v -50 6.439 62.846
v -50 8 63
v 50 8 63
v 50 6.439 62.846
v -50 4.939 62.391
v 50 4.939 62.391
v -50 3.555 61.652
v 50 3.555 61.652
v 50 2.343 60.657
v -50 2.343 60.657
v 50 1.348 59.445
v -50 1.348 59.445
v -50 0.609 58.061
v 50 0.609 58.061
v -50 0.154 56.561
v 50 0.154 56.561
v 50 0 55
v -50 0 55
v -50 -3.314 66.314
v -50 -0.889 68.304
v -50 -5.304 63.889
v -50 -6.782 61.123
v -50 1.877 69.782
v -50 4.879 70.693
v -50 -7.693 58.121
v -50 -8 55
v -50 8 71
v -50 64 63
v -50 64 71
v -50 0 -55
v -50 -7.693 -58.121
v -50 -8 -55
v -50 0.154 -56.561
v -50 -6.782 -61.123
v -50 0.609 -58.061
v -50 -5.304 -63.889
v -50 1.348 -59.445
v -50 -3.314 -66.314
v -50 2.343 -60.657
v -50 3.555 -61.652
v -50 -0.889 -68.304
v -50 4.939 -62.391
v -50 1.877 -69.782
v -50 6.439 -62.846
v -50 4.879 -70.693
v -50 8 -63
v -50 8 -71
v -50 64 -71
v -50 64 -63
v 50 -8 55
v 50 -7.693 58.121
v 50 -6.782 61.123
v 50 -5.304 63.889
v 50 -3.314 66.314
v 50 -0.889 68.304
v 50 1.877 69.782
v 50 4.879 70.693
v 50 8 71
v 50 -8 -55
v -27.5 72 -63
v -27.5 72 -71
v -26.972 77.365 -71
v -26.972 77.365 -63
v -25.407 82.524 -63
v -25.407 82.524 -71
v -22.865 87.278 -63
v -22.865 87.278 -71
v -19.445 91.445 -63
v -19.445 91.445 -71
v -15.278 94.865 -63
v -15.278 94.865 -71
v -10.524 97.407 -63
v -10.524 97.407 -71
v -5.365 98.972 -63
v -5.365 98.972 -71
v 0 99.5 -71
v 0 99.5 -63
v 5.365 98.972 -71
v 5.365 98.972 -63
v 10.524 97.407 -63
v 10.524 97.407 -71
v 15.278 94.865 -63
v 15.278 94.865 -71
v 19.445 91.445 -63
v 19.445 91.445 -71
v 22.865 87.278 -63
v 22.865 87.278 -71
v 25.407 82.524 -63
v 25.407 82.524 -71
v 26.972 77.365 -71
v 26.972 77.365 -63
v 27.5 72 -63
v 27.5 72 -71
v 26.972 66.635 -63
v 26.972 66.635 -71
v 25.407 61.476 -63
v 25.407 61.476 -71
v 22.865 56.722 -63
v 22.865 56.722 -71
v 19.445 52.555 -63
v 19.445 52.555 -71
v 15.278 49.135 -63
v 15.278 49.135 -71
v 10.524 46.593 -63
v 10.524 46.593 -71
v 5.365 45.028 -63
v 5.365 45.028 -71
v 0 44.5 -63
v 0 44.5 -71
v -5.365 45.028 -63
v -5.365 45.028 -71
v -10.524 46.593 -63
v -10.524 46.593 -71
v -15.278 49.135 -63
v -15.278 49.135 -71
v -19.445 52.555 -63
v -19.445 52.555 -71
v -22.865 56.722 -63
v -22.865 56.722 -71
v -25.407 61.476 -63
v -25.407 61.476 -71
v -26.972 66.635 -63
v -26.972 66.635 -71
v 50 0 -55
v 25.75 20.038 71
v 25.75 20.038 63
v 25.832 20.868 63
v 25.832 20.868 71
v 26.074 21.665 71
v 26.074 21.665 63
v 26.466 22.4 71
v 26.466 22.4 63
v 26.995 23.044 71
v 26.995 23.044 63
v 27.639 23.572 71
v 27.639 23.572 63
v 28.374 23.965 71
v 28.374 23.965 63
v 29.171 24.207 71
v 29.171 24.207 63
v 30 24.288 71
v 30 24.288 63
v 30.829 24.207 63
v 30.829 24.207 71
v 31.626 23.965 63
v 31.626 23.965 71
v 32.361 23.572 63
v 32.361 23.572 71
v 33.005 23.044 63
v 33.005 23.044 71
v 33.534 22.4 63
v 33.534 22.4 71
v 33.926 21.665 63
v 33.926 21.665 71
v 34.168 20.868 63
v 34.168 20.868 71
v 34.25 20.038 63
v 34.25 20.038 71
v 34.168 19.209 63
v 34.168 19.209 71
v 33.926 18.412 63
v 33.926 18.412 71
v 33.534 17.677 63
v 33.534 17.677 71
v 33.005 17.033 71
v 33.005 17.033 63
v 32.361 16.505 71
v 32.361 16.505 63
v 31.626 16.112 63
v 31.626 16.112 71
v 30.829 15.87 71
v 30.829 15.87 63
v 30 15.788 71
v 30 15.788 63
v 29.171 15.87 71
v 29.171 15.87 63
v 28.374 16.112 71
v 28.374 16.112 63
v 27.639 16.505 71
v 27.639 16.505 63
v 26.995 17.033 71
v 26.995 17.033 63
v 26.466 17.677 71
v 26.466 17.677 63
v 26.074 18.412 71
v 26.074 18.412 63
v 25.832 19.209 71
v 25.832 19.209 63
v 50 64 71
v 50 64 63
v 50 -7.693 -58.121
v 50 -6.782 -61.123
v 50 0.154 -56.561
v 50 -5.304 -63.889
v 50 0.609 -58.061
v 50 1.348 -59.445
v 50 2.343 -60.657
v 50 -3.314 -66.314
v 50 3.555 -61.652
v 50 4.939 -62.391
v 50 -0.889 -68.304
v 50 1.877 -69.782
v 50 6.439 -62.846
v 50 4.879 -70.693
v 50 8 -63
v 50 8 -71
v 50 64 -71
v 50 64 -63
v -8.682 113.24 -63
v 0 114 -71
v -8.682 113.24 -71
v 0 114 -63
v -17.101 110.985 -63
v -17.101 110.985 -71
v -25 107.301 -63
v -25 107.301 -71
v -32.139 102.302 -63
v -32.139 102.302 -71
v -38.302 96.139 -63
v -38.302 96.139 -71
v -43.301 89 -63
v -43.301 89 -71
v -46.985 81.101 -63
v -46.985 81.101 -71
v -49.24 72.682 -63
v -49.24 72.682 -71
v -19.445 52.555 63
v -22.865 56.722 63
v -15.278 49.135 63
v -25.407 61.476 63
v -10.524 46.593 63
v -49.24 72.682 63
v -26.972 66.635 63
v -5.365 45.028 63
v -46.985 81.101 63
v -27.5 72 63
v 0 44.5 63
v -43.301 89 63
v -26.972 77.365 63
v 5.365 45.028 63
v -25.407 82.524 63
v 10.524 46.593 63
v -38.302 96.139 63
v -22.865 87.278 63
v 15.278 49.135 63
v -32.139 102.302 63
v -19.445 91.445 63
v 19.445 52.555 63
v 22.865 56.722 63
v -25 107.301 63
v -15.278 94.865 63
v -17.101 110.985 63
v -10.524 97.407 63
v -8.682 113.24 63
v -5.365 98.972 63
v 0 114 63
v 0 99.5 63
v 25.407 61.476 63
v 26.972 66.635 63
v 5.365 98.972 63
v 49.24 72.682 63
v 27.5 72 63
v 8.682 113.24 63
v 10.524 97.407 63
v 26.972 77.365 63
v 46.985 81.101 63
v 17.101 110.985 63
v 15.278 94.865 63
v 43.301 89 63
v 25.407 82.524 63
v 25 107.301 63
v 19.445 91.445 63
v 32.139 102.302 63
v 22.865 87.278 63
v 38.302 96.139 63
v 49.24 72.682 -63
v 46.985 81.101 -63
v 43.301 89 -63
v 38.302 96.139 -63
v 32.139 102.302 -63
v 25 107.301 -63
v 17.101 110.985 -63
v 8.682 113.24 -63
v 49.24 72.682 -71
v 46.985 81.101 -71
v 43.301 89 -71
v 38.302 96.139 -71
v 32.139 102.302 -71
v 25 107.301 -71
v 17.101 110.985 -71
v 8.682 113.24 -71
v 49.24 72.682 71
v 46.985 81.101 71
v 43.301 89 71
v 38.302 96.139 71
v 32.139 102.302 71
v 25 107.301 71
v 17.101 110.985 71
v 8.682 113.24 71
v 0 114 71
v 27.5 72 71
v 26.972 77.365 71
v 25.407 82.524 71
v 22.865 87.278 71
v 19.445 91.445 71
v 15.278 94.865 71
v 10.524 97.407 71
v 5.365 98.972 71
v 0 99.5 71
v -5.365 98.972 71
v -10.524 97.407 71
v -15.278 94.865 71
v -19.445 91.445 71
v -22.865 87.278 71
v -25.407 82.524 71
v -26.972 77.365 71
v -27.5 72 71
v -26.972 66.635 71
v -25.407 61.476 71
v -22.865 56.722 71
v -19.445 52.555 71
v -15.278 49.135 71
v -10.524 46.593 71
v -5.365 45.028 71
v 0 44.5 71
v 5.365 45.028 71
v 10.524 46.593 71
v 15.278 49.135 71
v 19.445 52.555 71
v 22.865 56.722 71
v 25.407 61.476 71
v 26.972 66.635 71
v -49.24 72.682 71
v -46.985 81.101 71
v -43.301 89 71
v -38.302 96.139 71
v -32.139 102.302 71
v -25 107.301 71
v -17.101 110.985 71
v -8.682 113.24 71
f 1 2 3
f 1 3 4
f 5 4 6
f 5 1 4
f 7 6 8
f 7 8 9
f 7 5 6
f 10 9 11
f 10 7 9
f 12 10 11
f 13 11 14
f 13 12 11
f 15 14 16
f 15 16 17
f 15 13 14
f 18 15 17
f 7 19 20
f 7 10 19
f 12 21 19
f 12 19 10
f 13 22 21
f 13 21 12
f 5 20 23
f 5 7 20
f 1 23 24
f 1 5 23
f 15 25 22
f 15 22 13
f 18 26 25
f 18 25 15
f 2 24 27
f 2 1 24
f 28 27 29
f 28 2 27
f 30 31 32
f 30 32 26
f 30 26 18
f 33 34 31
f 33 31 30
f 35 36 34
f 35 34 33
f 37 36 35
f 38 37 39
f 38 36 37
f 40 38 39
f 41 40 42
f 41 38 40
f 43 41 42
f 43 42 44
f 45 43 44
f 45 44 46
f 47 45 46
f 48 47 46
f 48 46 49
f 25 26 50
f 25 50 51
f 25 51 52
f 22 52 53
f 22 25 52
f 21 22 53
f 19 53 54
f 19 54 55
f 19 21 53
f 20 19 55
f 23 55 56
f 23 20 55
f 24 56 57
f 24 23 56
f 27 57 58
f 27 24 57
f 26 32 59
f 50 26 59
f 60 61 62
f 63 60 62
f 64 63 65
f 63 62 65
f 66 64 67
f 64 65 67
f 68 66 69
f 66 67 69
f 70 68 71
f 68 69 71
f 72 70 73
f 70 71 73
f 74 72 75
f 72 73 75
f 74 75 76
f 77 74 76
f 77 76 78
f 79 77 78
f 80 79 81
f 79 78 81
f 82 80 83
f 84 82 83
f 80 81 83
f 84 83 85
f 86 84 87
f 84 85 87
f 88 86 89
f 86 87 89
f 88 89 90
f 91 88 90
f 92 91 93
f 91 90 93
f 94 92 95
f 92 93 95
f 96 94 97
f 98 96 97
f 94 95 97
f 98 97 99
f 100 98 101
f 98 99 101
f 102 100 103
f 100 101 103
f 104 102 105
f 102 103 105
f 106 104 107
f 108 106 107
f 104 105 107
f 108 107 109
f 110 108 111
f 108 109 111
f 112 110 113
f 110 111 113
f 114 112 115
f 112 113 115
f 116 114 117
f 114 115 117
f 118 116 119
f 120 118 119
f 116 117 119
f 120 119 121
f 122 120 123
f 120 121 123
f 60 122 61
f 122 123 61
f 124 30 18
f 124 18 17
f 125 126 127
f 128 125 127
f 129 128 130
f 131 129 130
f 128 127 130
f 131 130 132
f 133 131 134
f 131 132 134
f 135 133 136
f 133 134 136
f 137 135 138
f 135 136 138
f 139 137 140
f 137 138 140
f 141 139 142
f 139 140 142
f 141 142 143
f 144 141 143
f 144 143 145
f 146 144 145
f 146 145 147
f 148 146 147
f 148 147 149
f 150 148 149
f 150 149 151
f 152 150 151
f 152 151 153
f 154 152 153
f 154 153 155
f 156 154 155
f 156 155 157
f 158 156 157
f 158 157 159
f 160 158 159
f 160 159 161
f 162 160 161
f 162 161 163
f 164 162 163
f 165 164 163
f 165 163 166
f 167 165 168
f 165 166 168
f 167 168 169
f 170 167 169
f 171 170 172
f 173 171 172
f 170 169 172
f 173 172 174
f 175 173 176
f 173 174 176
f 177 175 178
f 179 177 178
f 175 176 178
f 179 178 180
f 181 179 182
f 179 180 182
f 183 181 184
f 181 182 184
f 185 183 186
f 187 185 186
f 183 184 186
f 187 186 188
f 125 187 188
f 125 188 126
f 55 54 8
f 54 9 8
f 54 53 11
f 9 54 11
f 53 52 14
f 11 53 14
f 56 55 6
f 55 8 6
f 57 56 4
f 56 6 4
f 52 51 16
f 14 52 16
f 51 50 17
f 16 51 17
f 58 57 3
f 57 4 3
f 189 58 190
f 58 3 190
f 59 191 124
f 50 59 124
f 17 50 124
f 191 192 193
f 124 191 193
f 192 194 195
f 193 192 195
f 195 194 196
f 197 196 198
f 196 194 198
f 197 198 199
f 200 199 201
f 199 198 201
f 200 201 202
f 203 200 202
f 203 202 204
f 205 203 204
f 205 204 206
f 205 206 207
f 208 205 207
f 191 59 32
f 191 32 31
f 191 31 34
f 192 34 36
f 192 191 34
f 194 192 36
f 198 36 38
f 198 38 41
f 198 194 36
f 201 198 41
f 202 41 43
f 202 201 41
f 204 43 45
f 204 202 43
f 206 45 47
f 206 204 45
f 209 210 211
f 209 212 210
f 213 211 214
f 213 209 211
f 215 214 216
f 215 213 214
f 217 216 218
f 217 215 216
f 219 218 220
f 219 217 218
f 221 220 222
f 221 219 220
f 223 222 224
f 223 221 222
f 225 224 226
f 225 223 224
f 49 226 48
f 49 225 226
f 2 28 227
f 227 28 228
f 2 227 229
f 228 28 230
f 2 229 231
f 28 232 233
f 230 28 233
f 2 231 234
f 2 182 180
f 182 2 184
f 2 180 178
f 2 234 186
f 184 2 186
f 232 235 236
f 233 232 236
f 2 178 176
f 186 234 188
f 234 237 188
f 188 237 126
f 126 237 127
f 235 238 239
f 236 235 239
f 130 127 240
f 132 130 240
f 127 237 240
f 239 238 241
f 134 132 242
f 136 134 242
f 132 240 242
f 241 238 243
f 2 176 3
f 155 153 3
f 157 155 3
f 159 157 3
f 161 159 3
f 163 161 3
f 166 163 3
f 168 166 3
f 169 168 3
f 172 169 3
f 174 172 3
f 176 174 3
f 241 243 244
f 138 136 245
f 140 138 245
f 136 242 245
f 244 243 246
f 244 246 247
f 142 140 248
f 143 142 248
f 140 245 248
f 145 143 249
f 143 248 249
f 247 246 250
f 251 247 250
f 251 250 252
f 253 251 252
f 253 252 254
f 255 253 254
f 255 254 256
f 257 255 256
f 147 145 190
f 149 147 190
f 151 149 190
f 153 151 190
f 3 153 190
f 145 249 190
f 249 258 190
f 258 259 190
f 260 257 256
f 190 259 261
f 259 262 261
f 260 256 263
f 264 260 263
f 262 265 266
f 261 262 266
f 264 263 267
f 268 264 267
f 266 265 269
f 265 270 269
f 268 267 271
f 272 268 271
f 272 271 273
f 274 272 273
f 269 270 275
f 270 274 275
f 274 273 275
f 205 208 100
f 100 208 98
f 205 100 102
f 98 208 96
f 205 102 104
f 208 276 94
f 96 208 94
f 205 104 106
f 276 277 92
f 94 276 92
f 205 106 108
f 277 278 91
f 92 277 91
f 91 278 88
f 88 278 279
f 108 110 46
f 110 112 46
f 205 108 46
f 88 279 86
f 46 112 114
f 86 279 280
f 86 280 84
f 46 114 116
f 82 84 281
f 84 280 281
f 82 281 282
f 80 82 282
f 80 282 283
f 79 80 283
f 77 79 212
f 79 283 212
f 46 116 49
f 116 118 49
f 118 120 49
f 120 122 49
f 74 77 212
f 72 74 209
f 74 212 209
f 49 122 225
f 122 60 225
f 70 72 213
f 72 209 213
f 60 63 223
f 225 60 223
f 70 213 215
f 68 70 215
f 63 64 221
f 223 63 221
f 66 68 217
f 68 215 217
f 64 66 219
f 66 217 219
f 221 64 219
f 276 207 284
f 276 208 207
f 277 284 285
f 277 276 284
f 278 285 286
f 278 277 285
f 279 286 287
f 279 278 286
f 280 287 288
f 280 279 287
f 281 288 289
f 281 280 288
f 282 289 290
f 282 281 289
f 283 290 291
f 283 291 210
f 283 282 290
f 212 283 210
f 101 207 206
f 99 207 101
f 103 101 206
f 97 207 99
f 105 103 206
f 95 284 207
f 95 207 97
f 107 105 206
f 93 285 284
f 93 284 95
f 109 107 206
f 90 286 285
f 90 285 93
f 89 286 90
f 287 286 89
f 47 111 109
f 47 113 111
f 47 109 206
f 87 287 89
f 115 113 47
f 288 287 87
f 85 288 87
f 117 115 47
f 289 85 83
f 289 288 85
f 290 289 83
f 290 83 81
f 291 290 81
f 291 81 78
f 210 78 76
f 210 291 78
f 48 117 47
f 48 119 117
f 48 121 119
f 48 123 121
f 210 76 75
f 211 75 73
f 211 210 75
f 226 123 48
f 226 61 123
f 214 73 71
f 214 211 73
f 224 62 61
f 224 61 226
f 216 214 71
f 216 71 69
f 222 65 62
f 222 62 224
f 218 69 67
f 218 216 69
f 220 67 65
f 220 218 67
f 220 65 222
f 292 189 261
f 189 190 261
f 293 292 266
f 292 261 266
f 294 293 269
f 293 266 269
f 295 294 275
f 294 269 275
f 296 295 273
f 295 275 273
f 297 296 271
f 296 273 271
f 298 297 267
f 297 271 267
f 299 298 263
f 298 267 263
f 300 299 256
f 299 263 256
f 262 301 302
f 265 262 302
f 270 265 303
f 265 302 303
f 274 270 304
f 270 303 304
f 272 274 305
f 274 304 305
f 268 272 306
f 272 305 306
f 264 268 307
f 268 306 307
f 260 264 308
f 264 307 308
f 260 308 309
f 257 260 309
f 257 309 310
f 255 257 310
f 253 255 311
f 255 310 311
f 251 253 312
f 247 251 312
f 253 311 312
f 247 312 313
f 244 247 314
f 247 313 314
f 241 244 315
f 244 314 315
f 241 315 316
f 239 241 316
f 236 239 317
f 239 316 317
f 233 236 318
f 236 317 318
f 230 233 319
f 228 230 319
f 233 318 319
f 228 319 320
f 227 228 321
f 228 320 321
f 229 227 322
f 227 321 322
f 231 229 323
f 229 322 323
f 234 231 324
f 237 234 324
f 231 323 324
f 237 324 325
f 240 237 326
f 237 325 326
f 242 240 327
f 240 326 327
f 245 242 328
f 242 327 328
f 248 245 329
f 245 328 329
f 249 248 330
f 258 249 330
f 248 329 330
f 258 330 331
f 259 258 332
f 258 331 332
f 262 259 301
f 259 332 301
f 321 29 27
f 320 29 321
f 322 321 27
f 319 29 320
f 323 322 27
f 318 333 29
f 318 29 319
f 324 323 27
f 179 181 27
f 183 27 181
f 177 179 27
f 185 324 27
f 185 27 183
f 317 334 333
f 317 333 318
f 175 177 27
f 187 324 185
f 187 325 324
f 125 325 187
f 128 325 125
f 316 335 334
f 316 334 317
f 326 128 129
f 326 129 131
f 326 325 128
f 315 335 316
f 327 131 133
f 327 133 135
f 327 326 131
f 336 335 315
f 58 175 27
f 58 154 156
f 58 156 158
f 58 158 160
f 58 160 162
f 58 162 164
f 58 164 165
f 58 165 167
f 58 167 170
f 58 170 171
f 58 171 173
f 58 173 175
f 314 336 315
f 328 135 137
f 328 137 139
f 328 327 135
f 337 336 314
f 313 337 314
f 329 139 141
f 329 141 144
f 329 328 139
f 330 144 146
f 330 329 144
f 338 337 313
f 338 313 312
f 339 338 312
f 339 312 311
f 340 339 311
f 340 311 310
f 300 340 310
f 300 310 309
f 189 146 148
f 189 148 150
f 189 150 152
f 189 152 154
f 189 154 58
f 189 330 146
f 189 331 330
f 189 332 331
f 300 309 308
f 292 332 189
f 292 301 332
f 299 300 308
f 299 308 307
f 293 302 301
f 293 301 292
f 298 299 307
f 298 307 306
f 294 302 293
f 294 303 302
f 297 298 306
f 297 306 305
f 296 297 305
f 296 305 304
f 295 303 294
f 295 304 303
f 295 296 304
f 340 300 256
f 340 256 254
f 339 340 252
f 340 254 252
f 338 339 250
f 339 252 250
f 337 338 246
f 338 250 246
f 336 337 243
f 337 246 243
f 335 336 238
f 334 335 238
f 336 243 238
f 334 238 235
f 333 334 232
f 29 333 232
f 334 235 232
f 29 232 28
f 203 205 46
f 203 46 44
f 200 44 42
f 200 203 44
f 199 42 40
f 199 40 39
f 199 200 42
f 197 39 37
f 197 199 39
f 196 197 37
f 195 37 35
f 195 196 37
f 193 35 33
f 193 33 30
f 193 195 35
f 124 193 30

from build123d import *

# Parameters (mm, degrees)
SKETCH_10_W                   = 100
SKETCH_10_H                   = 110
SM_BASE_FLANGE_2_DEPTH        = 8
SM_EDGE_FLANGE_3_DEPTH        = 100
SM_START                      = 8
SM_EDGE_FLANGE_3_PROFILE_W    = 100
SM_EDGE_FLANGE_3_PROFILE_H    = 106
SM_EDGE_FLANGE_3_PROFILE_R    = 27.5
SM_EDGE_FLANGE_3_FLAT_DEPTH   = 8
SM_EDGE_FLANGE_3_BEND_DEPTH   = 100
SM_EDGE_FLANGE_3_PROFILE_2_W  = 100
SM_EDGE_FLANGE_3_PROFILE_2_H  = 106
SM_EDGE_FLANGE_3_PROFILE_2_R  = 27.5
SM_EDGE_FLANGE_3_FLAT_2_DEPTH = 8
HOLE_WIZARD_M10_1_D           = 8.5
HOLE_WIZARD_M10_1_DEPTH       = 27.5
HOLE_WIZARD_M10_1_TIP         = 2.553657631
FILLET_1_R                    = 50


# Sheet-metal steps are written as plain solids
with BuildPart() as part:
    # 草图10 → 基体-法兰2 (new body)
    with BuildSketch(Plane(origin=(0, 0, 0), x_dir=(1, 0, 0), z_dir=(0, 1, 0))):
        Rectangle(SKETCH_10_W, SKETCH_10_H)
    extrude(amount=-SM_BASE_FLANGE_2_DEPTH)

    # 边线-法兰3 bend section (across the edge) → 边线-法兰3 (add)
    with BuildSketch(Plane(origin=(-50, 0, 63), x_dir=(0, 0, -1), z_dir=(1, 0, 0))):
        with BuildLine():
            Line((-8, 8), (0, 8))
            ThreePointArc((0, 8), (2.343145751, 2.343145751), (8, 0))
            Line((8, 0), (8, -8))
            ThreePointArc((8, -8), (-3.313708499, -3.313708499), (-8, 8))
        make_face()
    extrude(amount=SM_EDGE_FLANGE_3_DEPTH)

    # 边线-法兰3 profile (on flange) → 边线-法兰3 flat (add)
    with BuildSketch(Plane.XY.offset(63).offset(SM_START)):
        with Locations((0, 61)):
            Rectangle(SM_EDGE_FLANGE_3_PROFILE_W, SM_EDGE_FLANGE_3_PROFILE_H)
        with Locations((0, 72)):
            Circle(SM_EDGE_FLANGE_3_PROFILE_R, mode=Mode.SUBTRACT)
    extrude(amount=-SM_EDGE_FLANGE_3_FLAT_DEPTH)

    # 边线-法兰3 bend section 2 (across the edge) → 边线-法兰3 bend (add)
    with BuildSketch(Plane(origin=(50, 0, -63), x_dir=(0, 0, 1), z_dir=(-1, 0, 0))):
        with BuildLine():
            Line((-8, 8), (0, 8))
            ThreePointArc((0, 8), (2.343145751, 2.343145751), (8, 0))
            Line((8, 0), (8, -8))
            ThreePointArc((8, -8), (-3.313708499, -3.313708499), (-8, 8))
        make_face()
    extrude(amount=SM_EDGE_FLANGE_3_BEND_DEPTH)

    # 边线-法兰3 profile 2 (on flange) → 边线-法兰3 flat 2 (add)
    with BuildSketch(Plane(origin=(0, 0, -63), x_dir=(-1, 0, 0), z_dir=(0, 0, -1)).offset(SM_START)):
        with Locations((0, 61)):
            Rectangle(SM_EDGE_FLANGE_3_PROFILE_2_W, SM_EDGE_FLANGE_3_PROFILE_2_H)
        with Locations((0, 72)):
            Circle(SM_EDGE_FLANGE_3_PROFILE_2_R, mode=Mode.SUBTRACT)
    extrude(amount=-SM_EDGE_FLANGE_3_FLAT_2_DEPTH)

    # M10 螺纹孔1
    with Locations(Plane.XY.offset(71)):
        with Locations((30, 20.038475773)):
            Hole(HOLE_WIZARD_M10_1_D / 2, depth=HOLE_WIZARD_M10_1_DEPTH)
            with Locations((0, 0, -(HOLE_WIZARD_M10_1_DEPTH + HOLE_WIZARD_M10_1_TIP / 2))):  # 118° drill point
                Cone(0, HOLE_WIZARD_M10_1_D / 2, HOLE_WIZARD_M10_1_TIP, mode=Mode.SUBTRACT)

    # 圆角1
    fillet_1_edges = [part.edges().sort_by_distance(p)[0] for p in [
        (50, 114, -67),
        (-50, 114, -67),
        (-50, 114, 67),
        (50, 114, 67),
    ]]
    fillet(fillet_1_edges, radius=FILLET_1_R - 0.0001)  # a hair under: the kernel refuses the full size


solid = part.part
